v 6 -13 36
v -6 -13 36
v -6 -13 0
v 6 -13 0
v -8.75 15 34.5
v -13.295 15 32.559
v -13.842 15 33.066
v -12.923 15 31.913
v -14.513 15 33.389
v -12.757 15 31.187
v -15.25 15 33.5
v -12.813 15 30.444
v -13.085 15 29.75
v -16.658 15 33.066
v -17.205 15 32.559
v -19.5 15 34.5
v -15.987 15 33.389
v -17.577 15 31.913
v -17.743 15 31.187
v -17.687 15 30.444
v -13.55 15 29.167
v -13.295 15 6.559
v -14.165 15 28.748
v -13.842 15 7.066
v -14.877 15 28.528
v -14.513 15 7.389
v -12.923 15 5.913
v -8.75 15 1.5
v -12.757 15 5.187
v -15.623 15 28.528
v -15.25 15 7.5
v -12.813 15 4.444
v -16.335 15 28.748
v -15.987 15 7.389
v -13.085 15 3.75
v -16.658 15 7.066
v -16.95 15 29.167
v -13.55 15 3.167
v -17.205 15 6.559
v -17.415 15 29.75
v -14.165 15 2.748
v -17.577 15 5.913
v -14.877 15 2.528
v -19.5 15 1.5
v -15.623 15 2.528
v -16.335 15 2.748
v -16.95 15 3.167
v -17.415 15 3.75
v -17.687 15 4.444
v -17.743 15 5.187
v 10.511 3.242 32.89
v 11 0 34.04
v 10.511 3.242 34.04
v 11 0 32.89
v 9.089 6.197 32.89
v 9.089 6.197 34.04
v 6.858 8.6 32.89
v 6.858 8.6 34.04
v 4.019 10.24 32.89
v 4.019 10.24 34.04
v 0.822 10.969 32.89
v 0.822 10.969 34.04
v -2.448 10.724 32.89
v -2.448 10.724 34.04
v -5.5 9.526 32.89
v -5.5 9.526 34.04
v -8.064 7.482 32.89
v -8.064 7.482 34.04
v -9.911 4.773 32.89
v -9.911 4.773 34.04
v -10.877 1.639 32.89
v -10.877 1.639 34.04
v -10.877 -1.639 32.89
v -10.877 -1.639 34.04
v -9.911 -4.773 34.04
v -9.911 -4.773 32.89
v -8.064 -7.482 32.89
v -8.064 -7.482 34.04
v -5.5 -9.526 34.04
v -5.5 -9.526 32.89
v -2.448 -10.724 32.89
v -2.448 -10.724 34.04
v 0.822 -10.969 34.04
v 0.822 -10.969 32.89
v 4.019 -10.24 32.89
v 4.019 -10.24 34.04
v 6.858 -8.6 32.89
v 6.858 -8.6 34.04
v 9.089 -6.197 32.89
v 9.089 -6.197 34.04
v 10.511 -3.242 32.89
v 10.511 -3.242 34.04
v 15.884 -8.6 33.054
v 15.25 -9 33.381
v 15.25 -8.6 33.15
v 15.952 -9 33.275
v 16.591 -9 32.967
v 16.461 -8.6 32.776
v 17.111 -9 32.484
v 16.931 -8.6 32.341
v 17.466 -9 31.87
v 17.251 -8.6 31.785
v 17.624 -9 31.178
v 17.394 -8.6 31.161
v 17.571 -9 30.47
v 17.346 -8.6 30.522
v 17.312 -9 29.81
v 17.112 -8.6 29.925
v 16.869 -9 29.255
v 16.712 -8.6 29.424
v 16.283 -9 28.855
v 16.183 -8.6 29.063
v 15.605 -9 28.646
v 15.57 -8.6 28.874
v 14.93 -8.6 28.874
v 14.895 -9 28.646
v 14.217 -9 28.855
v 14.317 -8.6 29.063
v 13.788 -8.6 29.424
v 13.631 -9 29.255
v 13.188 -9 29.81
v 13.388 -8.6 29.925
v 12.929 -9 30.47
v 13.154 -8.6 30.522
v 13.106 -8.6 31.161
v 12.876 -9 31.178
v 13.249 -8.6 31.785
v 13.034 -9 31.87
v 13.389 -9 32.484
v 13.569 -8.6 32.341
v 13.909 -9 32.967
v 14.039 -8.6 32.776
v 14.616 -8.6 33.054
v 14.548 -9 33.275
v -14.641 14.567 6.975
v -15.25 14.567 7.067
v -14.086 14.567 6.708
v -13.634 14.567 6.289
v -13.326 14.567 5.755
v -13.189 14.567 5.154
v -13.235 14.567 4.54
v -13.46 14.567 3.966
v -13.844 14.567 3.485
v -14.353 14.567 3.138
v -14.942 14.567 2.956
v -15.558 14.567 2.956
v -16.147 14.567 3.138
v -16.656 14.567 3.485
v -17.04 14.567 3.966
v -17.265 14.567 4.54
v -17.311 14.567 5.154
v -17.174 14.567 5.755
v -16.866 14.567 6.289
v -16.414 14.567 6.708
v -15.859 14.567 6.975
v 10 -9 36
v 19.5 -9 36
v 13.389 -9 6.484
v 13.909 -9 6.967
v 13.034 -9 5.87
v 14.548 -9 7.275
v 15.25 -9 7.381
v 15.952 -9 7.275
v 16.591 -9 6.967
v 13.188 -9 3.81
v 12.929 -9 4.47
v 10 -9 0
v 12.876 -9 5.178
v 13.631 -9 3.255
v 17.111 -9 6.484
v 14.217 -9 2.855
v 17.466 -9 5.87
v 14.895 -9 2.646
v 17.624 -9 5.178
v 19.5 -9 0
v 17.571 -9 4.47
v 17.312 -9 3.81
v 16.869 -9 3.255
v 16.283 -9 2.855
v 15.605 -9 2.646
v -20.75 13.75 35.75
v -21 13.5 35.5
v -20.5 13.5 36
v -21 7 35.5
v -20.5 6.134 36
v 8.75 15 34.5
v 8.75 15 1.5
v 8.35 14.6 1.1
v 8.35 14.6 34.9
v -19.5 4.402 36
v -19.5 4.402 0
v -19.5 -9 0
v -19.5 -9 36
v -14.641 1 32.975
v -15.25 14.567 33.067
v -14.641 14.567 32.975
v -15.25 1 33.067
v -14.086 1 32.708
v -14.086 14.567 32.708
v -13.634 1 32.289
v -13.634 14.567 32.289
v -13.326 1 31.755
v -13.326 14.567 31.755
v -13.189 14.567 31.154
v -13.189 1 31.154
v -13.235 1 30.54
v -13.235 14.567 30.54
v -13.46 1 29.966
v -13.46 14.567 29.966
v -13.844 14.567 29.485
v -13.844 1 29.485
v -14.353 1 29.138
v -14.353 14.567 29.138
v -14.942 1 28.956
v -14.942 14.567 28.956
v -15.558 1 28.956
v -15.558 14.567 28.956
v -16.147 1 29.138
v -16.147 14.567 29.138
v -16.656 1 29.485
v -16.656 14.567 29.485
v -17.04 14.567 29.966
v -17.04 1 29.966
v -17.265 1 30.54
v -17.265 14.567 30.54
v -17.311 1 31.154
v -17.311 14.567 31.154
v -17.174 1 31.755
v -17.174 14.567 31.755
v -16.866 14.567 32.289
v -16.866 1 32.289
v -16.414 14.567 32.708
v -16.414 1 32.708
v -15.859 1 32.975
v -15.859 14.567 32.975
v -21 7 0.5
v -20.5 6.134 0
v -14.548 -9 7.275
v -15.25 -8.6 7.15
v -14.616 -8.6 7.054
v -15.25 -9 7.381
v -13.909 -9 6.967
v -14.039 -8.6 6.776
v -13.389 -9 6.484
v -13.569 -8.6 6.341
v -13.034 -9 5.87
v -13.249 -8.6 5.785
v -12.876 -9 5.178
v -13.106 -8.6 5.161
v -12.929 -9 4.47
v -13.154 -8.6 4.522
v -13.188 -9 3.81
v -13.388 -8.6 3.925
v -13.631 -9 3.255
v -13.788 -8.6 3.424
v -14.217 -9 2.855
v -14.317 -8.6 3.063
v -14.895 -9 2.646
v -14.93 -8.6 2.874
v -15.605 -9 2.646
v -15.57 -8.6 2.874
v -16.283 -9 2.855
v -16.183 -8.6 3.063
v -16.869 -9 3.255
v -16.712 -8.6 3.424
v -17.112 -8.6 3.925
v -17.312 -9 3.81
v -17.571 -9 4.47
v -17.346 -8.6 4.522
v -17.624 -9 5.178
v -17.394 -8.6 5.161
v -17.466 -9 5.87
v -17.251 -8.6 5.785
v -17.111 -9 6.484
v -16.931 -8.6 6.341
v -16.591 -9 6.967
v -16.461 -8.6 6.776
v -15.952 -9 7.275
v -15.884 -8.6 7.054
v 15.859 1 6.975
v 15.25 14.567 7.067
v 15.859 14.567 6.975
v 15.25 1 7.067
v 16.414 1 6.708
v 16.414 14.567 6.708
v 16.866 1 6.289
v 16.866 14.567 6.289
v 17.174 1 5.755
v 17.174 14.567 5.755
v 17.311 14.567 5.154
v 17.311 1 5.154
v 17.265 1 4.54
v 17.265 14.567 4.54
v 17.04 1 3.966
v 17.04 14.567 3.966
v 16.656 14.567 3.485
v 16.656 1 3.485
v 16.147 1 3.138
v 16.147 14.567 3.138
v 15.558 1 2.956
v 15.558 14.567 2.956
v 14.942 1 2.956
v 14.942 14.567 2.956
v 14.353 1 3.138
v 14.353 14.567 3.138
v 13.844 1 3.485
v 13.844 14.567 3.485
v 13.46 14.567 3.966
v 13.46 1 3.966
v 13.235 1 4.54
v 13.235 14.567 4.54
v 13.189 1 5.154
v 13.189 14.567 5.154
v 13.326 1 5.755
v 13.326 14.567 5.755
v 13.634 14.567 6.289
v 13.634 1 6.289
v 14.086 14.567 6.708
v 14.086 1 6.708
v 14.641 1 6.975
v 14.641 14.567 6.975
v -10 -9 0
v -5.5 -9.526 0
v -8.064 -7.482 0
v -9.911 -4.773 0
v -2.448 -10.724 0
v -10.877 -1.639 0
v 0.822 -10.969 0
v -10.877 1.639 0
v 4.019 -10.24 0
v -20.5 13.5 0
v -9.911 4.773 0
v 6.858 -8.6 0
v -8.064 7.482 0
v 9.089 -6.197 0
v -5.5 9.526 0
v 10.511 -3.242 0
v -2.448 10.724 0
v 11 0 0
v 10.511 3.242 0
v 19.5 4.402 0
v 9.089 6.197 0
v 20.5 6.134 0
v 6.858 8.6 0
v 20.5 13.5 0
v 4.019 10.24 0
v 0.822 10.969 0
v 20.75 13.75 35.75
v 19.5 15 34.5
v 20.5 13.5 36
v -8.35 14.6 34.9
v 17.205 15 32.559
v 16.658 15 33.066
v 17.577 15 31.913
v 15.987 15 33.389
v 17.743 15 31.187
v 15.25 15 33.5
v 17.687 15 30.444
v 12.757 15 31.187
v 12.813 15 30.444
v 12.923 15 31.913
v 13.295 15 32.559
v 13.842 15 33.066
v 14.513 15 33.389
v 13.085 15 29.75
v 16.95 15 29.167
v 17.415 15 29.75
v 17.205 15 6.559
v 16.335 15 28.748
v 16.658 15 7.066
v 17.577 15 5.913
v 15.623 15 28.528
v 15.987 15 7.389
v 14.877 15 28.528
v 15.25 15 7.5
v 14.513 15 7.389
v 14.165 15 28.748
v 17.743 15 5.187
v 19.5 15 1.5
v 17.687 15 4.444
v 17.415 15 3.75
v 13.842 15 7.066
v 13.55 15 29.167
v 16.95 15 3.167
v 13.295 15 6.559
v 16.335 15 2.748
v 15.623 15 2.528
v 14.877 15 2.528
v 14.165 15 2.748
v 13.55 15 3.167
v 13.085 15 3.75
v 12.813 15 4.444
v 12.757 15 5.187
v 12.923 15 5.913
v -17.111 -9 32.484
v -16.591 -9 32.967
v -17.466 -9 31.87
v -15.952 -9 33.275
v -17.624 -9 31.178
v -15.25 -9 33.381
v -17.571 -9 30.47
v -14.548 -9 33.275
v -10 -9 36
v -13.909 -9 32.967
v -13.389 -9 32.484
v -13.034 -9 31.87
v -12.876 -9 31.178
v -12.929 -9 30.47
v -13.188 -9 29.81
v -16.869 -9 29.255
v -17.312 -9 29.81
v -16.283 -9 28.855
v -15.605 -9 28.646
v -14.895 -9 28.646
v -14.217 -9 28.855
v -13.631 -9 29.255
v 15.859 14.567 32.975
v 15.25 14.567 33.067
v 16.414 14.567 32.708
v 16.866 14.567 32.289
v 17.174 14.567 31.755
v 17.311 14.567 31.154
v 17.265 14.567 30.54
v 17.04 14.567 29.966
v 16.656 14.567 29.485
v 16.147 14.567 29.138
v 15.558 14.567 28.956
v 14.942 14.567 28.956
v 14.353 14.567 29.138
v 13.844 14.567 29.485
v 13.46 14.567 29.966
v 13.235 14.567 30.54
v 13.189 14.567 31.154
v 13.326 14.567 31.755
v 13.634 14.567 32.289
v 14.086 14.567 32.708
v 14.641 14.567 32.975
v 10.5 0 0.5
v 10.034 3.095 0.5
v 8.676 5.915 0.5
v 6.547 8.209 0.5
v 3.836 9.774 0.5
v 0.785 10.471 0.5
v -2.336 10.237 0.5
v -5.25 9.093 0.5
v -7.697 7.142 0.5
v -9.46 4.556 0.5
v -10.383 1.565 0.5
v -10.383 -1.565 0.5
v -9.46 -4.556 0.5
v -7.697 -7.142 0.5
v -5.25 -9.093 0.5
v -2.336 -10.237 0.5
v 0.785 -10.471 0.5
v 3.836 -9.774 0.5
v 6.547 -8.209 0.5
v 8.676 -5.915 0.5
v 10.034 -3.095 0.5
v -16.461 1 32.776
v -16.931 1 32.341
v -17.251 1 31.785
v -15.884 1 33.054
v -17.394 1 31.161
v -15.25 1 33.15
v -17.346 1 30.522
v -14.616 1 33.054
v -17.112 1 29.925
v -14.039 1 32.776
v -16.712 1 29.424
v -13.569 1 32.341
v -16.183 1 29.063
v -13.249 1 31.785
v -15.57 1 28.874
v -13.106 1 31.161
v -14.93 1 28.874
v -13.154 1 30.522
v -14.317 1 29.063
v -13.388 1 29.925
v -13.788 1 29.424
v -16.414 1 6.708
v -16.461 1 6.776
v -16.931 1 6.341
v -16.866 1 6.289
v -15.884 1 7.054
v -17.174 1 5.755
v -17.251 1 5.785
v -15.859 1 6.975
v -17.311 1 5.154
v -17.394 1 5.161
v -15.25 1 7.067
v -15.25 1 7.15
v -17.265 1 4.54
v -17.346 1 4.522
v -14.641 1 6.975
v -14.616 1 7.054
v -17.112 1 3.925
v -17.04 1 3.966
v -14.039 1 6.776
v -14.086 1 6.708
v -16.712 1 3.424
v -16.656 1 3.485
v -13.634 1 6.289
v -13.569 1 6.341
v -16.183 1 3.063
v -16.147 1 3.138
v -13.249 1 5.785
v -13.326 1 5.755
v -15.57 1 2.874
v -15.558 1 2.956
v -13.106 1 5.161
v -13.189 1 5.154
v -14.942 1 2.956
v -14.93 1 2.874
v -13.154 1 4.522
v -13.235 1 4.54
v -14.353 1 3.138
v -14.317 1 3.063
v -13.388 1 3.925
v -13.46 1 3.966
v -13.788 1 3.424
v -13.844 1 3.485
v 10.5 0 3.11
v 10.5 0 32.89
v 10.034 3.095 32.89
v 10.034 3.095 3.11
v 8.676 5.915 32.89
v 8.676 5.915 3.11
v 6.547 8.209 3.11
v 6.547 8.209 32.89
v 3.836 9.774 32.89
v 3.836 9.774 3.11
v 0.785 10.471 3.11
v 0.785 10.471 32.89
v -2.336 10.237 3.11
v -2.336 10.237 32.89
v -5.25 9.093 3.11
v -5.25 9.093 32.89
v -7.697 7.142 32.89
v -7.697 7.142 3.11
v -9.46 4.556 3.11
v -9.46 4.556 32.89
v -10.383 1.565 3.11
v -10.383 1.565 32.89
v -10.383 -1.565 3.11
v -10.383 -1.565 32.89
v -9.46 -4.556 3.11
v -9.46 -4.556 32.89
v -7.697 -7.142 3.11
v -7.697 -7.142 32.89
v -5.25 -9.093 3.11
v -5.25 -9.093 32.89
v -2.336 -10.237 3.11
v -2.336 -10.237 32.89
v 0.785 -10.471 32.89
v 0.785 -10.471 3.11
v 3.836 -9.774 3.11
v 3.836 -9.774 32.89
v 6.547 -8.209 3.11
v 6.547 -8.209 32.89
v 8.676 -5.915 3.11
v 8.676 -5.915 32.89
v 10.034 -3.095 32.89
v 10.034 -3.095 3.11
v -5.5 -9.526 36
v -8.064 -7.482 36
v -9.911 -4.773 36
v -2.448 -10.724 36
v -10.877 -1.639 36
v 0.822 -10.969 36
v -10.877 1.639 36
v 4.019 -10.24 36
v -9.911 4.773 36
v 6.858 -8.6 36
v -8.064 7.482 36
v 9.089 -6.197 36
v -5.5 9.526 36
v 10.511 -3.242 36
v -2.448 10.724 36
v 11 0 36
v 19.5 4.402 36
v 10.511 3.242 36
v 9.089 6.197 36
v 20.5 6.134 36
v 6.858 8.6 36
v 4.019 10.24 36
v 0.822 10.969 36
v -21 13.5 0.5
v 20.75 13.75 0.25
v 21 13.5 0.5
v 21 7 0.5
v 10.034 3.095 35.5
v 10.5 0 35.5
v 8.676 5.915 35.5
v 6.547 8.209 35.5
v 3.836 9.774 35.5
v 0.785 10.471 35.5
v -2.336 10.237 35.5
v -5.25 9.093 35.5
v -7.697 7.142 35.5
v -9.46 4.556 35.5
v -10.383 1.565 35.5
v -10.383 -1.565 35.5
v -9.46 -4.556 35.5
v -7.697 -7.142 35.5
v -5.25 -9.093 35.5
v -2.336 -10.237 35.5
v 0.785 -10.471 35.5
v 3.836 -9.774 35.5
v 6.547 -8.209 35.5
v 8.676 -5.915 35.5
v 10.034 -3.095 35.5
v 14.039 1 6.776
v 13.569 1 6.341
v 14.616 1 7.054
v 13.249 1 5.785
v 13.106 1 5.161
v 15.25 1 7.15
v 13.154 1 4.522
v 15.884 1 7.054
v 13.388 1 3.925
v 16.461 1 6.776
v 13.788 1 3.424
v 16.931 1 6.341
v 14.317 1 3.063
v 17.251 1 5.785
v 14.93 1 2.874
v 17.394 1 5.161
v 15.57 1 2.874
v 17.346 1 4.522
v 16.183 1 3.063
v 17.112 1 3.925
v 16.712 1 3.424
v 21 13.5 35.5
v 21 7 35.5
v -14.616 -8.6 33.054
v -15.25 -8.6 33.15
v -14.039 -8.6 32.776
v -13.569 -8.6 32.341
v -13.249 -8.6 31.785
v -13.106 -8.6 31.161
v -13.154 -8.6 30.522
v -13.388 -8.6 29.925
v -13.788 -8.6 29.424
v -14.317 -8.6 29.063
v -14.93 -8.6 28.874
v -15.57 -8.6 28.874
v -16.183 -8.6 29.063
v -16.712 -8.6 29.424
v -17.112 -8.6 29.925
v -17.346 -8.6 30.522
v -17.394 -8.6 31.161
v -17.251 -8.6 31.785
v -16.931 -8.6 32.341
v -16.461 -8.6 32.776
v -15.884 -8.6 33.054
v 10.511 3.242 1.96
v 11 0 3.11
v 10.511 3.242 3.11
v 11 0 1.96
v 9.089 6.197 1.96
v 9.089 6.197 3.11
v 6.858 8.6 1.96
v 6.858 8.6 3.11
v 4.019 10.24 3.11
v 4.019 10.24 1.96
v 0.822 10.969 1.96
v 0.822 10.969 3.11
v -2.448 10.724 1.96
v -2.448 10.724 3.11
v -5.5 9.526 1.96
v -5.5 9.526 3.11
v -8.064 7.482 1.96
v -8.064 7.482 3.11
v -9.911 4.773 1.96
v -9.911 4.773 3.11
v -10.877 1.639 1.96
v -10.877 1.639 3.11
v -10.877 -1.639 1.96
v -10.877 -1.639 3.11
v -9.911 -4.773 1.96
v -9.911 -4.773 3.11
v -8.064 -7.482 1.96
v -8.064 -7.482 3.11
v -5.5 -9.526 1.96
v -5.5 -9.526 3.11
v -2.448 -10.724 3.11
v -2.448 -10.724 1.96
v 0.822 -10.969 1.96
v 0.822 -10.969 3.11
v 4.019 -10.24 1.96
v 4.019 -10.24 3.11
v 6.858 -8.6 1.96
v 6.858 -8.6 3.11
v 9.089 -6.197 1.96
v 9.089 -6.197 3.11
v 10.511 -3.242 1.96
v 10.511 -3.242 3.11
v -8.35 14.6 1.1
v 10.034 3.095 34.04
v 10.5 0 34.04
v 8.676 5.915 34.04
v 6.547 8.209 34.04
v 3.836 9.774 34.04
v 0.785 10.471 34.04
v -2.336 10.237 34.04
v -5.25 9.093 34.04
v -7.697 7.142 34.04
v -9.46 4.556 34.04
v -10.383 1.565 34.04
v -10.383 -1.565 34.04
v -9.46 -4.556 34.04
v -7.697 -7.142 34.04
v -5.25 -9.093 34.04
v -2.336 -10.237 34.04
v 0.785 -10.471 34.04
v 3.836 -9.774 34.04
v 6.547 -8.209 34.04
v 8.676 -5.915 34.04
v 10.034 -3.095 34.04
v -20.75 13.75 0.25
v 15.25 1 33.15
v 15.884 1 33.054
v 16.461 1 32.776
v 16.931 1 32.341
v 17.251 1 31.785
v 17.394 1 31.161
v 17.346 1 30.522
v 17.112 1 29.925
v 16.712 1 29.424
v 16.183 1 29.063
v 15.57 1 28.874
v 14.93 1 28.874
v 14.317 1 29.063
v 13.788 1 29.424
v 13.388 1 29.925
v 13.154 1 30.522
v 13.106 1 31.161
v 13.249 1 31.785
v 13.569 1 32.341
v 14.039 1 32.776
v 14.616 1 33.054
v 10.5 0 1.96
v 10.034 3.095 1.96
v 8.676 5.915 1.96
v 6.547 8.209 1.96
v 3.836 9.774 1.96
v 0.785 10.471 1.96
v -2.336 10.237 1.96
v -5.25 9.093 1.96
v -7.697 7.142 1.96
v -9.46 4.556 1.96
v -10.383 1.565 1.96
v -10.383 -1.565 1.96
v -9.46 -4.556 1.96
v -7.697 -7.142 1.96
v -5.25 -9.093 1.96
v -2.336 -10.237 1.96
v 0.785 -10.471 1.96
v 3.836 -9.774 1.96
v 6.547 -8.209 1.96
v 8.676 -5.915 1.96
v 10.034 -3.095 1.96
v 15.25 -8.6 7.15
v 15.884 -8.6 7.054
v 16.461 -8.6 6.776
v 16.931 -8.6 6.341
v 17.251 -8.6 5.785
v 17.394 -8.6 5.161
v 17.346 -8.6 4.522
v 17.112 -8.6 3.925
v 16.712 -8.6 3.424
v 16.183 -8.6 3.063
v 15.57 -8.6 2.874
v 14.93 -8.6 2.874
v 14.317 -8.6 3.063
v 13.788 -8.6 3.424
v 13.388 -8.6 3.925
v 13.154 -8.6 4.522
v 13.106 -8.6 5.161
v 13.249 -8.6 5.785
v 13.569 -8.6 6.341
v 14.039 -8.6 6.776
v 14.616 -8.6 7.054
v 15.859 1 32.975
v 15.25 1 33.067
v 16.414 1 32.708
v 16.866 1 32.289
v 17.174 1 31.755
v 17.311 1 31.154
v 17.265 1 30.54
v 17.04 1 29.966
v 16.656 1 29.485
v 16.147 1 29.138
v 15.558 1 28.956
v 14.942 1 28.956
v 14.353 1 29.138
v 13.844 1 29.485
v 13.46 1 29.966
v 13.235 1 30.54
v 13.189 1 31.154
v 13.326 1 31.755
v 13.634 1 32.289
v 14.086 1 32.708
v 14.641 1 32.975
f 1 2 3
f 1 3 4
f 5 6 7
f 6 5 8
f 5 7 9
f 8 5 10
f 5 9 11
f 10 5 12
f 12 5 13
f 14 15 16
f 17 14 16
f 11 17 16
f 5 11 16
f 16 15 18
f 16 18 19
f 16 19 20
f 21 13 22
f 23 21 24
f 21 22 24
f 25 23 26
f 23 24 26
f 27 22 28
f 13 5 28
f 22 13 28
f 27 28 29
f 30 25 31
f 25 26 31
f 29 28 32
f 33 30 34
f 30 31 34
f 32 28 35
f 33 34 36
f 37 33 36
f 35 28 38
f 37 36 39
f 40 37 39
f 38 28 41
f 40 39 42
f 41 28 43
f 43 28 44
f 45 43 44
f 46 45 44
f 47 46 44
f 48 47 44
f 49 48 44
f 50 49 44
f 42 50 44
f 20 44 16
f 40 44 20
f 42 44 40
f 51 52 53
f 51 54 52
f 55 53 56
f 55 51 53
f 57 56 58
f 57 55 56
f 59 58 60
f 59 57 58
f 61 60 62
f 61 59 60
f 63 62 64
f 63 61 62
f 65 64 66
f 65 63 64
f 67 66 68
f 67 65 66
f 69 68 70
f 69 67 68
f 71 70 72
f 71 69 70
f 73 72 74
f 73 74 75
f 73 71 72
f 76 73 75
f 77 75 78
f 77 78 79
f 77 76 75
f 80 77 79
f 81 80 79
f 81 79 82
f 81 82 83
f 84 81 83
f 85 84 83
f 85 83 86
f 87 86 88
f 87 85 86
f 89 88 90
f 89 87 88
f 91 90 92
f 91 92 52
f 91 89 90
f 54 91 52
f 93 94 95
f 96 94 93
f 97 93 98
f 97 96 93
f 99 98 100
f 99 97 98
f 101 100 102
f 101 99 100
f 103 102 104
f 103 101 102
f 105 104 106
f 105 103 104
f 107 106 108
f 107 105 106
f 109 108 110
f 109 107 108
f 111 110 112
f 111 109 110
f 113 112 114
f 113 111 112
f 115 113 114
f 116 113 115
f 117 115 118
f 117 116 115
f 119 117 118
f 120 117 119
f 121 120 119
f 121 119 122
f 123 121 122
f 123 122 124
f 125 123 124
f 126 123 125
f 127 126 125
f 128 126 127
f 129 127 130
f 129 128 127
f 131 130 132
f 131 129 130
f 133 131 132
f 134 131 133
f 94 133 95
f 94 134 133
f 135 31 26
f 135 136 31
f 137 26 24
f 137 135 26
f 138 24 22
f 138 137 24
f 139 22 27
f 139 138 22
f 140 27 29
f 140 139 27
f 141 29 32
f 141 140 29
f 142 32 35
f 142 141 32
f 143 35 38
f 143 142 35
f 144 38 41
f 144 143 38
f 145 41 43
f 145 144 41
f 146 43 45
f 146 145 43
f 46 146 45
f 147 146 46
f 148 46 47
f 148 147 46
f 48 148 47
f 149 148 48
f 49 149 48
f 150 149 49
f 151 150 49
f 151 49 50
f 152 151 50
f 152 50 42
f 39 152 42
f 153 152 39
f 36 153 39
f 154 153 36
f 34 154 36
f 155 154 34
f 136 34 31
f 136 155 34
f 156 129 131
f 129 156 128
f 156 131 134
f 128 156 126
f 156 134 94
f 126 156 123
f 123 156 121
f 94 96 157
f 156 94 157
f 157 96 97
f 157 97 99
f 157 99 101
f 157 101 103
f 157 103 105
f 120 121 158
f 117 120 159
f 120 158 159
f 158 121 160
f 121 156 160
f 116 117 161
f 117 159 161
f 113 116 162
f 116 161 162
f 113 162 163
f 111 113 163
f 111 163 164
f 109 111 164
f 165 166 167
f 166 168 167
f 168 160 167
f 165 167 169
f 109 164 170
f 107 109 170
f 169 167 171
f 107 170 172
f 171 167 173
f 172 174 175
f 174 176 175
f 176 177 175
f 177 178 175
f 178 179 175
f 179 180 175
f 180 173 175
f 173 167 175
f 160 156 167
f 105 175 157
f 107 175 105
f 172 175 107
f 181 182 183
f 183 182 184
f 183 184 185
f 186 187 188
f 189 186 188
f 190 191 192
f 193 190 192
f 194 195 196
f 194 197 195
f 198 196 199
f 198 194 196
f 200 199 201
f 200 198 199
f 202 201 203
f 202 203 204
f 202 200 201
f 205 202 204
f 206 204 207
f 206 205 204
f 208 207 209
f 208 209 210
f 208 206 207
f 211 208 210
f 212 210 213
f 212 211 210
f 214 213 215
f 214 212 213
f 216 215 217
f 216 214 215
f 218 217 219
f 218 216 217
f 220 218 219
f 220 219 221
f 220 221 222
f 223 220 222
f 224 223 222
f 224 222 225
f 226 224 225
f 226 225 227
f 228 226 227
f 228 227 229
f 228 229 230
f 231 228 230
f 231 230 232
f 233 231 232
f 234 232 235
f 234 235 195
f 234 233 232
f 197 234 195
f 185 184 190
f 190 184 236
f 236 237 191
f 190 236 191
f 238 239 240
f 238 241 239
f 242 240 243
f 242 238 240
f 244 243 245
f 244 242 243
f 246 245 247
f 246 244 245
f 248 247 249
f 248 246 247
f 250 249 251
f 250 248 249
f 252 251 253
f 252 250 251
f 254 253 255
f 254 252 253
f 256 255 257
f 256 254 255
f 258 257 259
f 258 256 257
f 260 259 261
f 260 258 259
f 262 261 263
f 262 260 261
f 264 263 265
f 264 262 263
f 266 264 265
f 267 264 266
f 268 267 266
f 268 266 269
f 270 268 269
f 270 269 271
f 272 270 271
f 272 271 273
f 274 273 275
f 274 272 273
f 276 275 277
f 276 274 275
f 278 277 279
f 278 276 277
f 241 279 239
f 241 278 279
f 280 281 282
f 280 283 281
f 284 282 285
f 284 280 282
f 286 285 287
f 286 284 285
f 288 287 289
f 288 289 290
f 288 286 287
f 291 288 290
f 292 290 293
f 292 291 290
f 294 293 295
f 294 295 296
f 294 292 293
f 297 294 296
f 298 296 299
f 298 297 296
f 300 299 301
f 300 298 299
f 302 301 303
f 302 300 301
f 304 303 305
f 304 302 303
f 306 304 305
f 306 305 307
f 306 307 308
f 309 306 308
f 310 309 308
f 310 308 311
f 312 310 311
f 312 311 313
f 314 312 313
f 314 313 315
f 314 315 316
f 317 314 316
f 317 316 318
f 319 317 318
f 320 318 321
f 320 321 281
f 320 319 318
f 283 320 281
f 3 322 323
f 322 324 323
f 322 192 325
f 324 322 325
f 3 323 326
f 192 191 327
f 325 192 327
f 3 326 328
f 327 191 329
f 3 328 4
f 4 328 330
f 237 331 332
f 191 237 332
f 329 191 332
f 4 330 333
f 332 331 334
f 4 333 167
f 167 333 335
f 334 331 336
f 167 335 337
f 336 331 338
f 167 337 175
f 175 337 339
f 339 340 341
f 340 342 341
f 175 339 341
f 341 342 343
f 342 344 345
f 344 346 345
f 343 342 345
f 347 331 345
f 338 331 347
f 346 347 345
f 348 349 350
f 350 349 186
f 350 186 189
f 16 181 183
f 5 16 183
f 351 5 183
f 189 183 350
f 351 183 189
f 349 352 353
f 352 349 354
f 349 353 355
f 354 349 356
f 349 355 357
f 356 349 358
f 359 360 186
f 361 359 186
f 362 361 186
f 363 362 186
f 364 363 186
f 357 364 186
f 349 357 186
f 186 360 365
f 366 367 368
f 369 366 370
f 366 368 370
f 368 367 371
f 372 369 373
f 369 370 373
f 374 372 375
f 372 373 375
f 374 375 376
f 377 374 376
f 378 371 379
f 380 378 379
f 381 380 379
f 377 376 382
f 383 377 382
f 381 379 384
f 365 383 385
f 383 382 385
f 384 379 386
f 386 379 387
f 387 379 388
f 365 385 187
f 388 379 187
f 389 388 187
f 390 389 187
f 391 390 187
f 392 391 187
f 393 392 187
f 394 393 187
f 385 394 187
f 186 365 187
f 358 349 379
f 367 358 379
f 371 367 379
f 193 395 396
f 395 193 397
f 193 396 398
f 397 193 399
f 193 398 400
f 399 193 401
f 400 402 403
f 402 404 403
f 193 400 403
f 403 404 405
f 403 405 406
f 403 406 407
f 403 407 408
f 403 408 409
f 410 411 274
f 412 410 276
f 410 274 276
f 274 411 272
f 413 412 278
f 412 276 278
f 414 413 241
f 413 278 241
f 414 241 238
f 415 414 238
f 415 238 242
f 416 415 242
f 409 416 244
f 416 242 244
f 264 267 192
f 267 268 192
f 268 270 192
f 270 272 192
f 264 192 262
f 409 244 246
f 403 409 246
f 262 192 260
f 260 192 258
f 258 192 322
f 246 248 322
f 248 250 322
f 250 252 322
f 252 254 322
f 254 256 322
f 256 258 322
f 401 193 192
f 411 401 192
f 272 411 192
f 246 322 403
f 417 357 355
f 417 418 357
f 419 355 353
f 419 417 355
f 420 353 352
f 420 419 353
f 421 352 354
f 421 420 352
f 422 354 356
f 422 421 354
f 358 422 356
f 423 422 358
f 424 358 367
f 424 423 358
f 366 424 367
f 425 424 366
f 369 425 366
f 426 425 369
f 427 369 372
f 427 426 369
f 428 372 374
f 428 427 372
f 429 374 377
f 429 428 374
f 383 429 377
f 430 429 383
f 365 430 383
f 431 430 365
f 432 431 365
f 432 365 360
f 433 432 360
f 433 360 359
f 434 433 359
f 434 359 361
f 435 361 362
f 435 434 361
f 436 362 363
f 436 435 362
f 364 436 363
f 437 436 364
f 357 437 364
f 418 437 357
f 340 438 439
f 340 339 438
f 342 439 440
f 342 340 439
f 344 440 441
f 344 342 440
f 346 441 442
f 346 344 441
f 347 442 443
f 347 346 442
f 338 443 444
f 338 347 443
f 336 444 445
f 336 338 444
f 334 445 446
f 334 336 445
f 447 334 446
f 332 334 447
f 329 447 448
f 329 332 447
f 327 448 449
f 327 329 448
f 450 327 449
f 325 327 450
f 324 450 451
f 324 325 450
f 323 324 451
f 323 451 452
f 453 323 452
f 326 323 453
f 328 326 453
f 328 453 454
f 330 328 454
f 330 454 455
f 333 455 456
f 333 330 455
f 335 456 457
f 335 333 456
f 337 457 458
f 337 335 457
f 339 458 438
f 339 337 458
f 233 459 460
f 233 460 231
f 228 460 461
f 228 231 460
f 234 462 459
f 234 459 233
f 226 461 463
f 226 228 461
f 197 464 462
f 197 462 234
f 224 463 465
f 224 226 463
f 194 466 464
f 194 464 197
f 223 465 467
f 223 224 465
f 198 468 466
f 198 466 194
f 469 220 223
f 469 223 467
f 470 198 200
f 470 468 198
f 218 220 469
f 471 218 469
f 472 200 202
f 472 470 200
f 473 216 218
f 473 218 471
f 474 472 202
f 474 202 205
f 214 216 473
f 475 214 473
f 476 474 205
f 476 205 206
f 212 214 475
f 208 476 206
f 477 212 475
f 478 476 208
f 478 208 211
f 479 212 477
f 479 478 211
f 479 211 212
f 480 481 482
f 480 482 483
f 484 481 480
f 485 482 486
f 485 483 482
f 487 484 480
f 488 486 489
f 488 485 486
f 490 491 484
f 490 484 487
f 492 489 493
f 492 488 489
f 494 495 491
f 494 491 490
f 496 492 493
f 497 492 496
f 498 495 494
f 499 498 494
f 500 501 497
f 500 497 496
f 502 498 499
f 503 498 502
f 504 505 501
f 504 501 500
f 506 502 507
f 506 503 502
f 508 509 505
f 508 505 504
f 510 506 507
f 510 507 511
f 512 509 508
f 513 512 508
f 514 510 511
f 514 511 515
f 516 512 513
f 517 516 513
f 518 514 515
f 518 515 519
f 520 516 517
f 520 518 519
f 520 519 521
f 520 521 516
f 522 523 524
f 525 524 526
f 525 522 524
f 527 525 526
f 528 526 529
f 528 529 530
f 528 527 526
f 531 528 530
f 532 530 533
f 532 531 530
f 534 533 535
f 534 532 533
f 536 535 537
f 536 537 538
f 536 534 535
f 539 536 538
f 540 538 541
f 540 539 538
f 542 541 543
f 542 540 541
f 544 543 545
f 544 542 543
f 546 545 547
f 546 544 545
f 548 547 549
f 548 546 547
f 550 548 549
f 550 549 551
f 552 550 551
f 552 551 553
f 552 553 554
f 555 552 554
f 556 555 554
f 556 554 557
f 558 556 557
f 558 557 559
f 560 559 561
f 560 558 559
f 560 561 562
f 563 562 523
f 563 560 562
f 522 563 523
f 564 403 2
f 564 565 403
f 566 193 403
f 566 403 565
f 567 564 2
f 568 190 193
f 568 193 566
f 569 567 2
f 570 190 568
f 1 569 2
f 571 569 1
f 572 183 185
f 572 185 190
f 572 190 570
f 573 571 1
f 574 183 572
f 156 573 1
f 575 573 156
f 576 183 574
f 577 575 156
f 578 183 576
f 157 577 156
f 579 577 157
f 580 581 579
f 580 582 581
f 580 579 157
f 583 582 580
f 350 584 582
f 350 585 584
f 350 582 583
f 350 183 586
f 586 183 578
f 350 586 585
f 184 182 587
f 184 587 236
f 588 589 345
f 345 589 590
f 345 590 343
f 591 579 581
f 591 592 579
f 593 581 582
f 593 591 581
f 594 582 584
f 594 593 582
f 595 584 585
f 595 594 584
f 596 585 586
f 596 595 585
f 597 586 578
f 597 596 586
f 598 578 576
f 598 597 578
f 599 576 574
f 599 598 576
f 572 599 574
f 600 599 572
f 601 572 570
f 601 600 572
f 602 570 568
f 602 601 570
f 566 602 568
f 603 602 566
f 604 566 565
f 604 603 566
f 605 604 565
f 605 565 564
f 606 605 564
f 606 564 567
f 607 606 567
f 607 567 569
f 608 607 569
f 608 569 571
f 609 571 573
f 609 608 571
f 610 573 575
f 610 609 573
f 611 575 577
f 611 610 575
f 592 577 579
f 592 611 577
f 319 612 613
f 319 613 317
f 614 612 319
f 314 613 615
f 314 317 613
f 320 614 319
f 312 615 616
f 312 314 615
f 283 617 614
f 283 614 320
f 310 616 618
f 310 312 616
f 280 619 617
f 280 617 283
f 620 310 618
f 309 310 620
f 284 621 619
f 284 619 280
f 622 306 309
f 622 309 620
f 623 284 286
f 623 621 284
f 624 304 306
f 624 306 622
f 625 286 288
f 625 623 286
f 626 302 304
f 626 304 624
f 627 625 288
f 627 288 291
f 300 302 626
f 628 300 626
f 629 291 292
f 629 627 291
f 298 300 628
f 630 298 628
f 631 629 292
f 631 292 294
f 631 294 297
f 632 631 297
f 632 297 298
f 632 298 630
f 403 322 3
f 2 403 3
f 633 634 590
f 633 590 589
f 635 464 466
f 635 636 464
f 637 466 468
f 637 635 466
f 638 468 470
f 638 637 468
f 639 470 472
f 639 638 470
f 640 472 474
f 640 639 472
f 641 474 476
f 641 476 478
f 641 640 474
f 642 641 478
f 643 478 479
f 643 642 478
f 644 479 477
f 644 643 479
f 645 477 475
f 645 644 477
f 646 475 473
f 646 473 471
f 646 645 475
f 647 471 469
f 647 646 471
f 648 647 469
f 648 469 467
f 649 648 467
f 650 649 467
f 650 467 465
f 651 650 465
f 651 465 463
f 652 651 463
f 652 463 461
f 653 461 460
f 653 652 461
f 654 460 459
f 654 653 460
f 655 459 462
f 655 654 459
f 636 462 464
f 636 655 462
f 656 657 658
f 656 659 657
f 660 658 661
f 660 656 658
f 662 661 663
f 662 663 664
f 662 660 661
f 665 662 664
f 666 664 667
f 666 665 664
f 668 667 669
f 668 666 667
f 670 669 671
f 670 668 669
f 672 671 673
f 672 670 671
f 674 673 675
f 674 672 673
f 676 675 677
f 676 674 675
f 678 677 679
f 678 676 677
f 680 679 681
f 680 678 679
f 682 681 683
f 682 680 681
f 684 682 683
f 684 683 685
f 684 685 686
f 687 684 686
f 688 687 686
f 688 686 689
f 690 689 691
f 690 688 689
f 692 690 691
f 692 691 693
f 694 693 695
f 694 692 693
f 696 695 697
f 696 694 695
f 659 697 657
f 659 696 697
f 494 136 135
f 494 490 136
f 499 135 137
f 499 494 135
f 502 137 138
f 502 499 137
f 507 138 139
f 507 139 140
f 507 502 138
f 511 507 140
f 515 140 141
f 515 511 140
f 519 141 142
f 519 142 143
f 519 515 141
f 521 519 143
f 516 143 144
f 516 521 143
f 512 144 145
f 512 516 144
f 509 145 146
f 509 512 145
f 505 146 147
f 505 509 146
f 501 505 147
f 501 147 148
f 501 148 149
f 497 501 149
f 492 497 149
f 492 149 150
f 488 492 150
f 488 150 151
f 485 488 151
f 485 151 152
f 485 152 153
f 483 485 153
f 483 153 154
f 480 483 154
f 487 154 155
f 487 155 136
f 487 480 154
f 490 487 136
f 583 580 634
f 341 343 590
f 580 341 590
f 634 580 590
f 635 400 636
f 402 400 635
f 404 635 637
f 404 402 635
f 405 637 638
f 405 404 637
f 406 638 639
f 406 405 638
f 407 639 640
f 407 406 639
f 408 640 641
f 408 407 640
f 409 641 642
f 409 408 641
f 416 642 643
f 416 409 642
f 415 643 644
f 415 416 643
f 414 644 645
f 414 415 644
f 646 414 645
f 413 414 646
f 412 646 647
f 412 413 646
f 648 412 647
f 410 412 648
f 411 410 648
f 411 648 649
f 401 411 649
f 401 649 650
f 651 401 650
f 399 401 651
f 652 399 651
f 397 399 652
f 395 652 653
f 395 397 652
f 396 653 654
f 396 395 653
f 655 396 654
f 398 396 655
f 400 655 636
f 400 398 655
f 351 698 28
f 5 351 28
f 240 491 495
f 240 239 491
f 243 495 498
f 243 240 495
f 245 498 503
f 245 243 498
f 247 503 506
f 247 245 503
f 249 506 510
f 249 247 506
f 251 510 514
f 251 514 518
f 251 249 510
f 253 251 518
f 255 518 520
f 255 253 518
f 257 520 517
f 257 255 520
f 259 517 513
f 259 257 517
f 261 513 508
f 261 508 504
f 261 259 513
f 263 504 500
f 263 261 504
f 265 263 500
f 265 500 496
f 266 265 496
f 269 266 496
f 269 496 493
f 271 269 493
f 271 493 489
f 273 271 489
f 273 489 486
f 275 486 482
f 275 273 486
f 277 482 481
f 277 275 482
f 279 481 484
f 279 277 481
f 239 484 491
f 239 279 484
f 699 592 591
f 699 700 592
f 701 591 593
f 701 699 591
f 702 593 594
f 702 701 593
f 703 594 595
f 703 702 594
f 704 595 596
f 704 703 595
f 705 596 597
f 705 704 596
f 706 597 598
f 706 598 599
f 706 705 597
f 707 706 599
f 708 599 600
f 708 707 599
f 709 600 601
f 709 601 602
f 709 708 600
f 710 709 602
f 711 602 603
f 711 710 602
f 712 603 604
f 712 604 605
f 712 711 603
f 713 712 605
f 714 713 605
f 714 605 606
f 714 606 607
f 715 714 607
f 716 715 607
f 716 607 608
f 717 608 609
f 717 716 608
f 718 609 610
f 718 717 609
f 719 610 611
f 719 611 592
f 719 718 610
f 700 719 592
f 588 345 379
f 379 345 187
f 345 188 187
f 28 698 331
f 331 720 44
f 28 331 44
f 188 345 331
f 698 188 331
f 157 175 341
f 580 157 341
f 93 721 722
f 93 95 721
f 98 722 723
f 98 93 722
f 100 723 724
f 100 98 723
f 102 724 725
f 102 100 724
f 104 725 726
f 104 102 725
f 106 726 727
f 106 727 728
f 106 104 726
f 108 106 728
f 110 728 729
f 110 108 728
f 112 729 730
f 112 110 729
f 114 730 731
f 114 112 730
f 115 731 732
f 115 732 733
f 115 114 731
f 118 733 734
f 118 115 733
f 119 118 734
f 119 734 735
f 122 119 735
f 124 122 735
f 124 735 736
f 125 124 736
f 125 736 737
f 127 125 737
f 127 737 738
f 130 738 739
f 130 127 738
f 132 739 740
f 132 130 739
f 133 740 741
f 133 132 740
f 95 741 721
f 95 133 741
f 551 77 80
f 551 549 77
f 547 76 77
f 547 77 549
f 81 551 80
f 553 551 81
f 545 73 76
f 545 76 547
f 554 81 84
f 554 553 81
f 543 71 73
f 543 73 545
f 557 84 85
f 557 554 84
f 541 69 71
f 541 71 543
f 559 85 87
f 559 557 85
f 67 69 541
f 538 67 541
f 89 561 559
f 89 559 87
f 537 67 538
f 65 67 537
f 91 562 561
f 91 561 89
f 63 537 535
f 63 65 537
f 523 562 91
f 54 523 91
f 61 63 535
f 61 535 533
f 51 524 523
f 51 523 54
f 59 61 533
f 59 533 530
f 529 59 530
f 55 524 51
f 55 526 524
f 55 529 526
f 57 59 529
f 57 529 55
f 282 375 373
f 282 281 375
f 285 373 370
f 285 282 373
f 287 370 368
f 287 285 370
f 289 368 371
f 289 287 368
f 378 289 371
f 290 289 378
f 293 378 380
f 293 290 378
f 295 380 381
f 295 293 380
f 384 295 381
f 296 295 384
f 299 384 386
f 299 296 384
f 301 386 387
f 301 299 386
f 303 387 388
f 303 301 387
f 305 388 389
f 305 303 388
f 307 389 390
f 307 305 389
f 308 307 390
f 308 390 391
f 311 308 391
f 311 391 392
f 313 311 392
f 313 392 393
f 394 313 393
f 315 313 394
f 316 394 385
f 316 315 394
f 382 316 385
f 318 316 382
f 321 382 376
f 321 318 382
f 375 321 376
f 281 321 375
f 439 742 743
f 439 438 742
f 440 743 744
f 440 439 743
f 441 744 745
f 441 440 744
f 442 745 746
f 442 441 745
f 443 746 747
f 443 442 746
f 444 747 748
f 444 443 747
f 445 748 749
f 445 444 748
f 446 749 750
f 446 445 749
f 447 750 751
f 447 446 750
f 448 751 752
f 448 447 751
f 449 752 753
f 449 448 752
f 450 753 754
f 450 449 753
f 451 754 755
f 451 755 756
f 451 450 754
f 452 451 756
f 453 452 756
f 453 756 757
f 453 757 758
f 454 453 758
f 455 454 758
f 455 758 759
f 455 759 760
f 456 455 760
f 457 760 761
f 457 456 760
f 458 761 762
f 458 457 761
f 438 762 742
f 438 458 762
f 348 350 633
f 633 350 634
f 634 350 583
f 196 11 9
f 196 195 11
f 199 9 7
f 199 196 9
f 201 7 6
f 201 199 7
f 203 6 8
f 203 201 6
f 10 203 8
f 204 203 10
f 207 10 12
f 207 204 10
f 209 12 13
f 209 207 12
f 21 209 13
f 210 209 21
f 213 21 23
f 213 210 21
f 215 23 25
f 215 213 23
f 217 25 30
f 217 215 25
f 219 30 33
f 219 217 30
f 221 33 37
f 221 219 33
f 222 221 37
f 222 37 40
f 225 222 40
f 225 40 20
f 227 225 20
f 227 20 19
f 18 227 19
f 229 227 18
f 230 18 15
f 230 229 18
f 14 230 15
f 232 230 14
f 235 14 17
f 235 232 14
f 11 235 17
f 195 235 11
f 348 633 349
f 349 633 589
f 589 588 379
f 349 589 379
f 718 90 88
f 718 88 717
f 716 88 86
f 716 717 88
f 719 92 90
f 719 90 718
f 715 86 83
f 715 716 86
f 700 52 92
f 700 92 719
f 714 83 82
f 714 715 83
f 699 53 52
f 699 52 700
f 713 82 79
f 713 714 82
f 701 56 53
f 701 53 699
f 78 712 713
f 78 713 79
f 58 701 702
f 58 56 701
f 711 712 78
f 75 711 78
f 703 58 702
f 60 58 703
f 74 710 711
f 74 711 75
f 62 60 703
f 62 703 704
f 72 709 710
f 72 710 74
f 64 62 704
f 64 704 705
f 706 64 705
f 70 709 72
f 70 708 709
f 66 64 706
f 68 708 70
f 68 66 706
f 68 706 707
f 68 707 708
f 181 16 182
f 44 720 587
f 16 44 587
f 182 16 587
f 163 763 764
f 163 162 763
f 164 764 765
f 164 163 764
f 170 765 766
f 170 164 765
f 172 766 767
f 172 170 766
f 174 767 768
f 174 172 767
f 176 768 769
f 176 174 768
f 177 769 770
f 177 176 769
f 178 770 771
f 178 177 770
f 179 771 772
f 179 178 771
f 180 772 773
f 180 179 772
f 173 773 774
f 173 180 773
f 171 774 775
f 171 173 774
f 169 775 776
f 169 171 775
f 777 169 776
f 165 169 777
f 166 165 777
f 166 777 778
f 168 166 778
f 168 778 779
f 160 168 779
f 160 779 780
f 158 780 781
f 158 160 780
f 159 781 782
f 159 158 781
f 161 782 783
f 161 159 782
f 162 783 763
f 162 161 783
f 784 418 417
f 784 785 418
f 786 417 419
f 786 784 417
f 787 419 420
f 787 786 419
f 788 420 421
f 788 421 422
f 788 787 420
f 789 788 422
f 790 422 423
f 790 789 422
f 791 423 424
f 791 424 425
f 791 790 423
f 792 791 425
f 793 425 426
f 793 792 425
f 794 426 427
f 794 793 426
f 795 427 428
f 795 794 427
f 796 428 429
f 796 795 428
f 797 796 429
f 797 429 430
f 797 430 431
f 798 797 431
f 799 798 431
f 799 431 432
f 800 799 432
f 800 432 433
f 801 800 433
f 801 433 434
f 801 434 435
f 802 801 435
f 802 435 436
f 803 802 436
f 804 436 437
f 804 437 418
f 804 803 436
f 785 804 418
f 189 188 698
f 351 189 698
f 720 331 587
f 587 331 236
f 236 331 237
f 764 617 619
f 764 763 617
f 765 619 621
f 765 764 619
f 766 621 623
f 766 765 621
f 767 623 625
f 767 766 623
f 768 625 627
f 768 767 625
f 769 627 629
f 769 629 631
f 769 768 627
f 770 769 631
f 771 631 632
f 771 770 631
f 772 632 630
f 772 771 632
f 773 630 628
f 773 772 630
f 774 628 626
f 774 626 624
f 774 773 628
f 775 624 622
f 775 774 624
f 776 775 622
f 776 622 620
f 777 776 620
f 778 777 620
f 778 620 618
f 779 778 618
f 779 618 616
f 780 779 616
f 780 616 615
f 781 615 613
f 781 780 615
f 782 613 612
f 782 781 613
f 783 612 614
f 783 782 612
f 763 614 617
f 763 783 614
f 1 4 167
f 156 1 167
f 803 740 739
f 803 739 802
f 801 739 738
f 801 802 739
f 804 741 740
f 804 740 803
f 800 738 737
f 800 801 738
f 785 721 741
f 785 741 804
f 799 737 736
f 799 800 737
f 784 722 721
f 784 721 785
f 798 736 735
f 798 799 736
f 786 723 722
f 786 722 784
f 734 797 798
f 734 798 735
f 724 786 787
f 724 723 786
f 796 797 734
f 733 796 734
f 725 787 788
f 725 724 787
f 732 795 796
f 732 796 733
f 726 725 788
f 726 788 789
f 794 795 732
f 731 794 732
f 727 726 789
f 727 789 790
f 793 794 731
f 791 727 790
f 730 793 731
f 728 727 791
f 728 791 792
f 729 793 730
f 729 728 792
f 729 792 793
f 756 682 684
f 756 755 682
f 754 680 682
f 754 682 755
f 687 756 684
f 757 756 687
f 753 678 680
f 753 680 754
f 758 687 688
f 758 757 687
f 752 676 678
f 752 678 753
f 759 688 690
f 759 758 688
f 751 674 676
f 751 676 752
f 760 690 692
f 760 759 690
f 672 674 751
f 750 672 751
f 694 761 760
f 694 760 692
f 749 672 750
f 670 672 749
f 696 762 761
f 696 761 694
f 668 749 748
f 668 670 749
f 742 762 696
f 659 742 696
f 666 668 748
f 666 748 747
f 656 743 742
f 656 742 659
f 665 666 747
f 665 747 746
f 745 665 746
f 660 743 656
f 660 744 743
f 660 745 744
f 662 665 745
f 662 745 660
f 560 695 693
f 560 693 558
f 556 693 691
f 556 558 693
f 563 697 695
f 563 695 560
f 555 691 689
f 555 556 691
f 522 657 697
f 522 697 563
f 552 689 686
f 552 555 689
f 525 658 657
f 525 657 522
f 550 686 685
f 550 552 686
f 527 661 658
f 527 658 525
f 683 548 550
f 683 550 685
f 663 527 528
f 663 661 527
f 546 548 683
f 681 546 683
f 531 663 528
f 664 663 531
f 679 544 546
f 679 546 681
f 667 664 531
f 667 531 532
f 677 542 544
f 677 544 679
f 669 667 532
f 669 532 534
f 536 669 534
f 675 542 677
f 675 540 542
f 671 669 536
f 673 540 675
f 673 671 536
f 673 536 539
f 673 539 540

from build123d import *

# Parameters (mm, degrees)
BOSS_EXTRUDE1_DEPTH     = 36
CUT_EXTRUDE1_DEPTH      = 21
CUT_EXTRUDE1_DEPTH_BACK = 21
SKETCH2_W               = 54
SKETCH2_H               = 56
CUT_EXTRUDE2_DEPTH      = 28
CUT_EXTRUDE2_DEPTH_BACK = 28
SKETCH4_W               = 52
SKETCH4_H               = 46


with BuildPart() as part:
    # Sketch1 → Boss-Extrude1 (new body)
    with BuildSketch(Plane.XY):
        Polygon((-21, 13.5), (-21, 7), (-19.5, 4.401923789), (-19.5, -9), (-10, -9), (-6, -13), (6, -13), (10, -9), (19.5, -9), (19.5, 4.401923789), (21, 7), (21, 13.5), (19.5, 15), (8.75, 15), (8.35, 14.6), (-8.35, 14.6), (-8.75, 15), (-19.5, 15), align=None)
    extrude(amount=BOSS_EXTRUDE1_DEPTH)

    # Sketch2 → Cut-Extrude1 (cut, two sides: drawn at the far end of the back side and taken through both)
    with BuildSketch(Plane(origin=(0, 0, 0), x_dir=(0, 0, -1), z_dir=(1, 0, 0)).offset(-CUT_EXTRUDE1_DEPTH_BACK)):
        with Locations((-18, 0)):
            Rectangle(SKETCH2_W, SKETCH2_H)
        Polygon((-36, 13.5), (-36, -13), (0, -13), (0, 13.5), (-1.5, 15), (-34.5, 15), align=None, mode=Mode.SUBTRACT)
    extrude(amount=CUT_EXTRUDE1_DEPTH + CUT_EXTRUDE1_DEPTH_BACK, mode=Mode.SUBTRACT)

    # Sketch3 → Cut-Revolve1 (revolve, cut)
    with BuildSketch(Plane(origin=(0, 0, 0), x_dir=(0, 0, -1), z_dir=(1, 0, 0)), mode=Mode.PRIVATE) as cut_revolve1_sk:
        Polygon((-36, 0), (-36, 11), (-35.5, 10.5), (-34.04, 10.5), (-34.04, 11), (-32.89, 11), (-32.89, 10.5), (-3.11, 10.5), (-3.11, 11), (-1.96, 11), (-1.96, 10.5), (-0.5, 10.5), (0, 11), (0, 0), align=None)
    revolve(cut_revolve1_sk.sketch.rotate(Axis((0, 0, 0), (0, 0, 1)), 270), axis=Axis((0, 0, 0), (0, 0, 1)), mode=Mode.SUBTRACT)

    # Sketch4 → Cut-Extrude2 (cut, two sides: drawn at the far end of the back side and taken through both)
    with BuildSketch(Plane(origin=(0, 0, 0), x_dir=(1, 0, 0), z_dir=(0, 1, 0)).offset(-CUT_EXTRUDE2_DEPTH_BACK)):
        with Locations((0, -18)):
            Rectangle(SKETCH4_W, SKETCH4_H)
        Polygon((-21, -0.5), (-21, -35.5), (-20.5, -36), (20.5, -36), (21, -35.5), (21, -0.5), (20.5, 0), (-20.5, 0), align=None, mode=Mode.SUBTRACT)
    extrude(amount=CUT_EXTRUDE2_DEPTH + CUT_EXTRUDE2_DEPTH_BACK, mode=Mode.SUBTRACT)

    # Sketch5 → Cut-Revolve2 (revolve, cut)
    with BuildSketch(Plane(origin=(15.25, 0, 0), x_dir=(0, 0, -1), z_dir=(1, 0, 0)), mode=Mode.PRIVATE) as cut_revolve2_sk:
        Polygon((-5, 15), (-2.5, 15), (-2.933, 14.567), (-2.933, 1), (-2.85, 1), (-2.85, -8.6), (-2.619059892, -9), (-5, -9), align=None)
    revolve(cut_revolve2_sk.sketch.rotate(Axis((15.25, -9, 5), (0, 1, 0)), 180), axis=Axis((15.25, -9, 5), (0, 1, 0)), mode=Mode.SUBTRACT)

    # Sketch6 → Cut-Revolve3 (revolve, cut)
    with BuildSketch(Plane(origin=(15.25, 0, 0), x_dir=(0, 0, -1), z_dir=(1, 0, 0)), mode=Mode.PRIVATE) as cut_revolve3_sk:
        Polygon((-31, 15), (-28.5, 15), (-28.933, 14.567), (-28.933, 1), (-28.85, 1), (-28.85, -8.6), (-28.619059892, -9), (-31, -9), align=None)
    revolve(cut_revolve3_sk.sketch.rotate(Axis((15.25, -9, 31), (0, 1, 0)), 180), axis=Axis((15.25, -9, 31), (0, 1, 0)), mode=Mode.SUBTRACT)

    # Sketch7 → Cut-Revolve4 (revolve, cut)
    with BuildSketch(Plane(origin=(-15.25, 0, 0), x_dir=(0, 0, -1), z_dir=(1, 0, 0)), mode=Mode.PRIVATE) as cut_revolve4_sk:
        Polygon((-5, 15), (-2.5, 15), (-2.933, 14.567), (-2.933, 1), (-2.85, 1), (-2.85, -8.6), (-2.619059892, -9), (-5, -9), align=None)
    revolve(cut_revolve4_sk.sketch.rotate(Axis((-15.25, -9, 5), (0, 1, 0)), 180), axis=Axis((-15.25, -9, 5), (0, 1, 0)), mode=Mode.SUBTRACT)

    # Sketch8 → Cut-Revolve5 (revolve, cut)
    with BuildSketch(Plane(origin=(-15.25, 0, 0), x_dir=(0, 0, -1), z_dir=(1, 0, 0)), mode=Mode.PRIVATE) as cut_revolve5_sk:
        Polygon((-31, 15), (-28.5, 15), (-28.933, 14.567), (-28.933, 1), (-28.85, 1), (-28.85, -8.6), (-28.619059892, -9), (-31, -9), align=None)
    revolve(cut_revolve5_sk.sketch.rotate(Axis((-15.25, -9, 31), (0, 1, 0)), 180), axis=Axis((-15.25, -9, 31), (0, 1, 0)), mode=Mode.SUBTRACT)


solid = part.part
